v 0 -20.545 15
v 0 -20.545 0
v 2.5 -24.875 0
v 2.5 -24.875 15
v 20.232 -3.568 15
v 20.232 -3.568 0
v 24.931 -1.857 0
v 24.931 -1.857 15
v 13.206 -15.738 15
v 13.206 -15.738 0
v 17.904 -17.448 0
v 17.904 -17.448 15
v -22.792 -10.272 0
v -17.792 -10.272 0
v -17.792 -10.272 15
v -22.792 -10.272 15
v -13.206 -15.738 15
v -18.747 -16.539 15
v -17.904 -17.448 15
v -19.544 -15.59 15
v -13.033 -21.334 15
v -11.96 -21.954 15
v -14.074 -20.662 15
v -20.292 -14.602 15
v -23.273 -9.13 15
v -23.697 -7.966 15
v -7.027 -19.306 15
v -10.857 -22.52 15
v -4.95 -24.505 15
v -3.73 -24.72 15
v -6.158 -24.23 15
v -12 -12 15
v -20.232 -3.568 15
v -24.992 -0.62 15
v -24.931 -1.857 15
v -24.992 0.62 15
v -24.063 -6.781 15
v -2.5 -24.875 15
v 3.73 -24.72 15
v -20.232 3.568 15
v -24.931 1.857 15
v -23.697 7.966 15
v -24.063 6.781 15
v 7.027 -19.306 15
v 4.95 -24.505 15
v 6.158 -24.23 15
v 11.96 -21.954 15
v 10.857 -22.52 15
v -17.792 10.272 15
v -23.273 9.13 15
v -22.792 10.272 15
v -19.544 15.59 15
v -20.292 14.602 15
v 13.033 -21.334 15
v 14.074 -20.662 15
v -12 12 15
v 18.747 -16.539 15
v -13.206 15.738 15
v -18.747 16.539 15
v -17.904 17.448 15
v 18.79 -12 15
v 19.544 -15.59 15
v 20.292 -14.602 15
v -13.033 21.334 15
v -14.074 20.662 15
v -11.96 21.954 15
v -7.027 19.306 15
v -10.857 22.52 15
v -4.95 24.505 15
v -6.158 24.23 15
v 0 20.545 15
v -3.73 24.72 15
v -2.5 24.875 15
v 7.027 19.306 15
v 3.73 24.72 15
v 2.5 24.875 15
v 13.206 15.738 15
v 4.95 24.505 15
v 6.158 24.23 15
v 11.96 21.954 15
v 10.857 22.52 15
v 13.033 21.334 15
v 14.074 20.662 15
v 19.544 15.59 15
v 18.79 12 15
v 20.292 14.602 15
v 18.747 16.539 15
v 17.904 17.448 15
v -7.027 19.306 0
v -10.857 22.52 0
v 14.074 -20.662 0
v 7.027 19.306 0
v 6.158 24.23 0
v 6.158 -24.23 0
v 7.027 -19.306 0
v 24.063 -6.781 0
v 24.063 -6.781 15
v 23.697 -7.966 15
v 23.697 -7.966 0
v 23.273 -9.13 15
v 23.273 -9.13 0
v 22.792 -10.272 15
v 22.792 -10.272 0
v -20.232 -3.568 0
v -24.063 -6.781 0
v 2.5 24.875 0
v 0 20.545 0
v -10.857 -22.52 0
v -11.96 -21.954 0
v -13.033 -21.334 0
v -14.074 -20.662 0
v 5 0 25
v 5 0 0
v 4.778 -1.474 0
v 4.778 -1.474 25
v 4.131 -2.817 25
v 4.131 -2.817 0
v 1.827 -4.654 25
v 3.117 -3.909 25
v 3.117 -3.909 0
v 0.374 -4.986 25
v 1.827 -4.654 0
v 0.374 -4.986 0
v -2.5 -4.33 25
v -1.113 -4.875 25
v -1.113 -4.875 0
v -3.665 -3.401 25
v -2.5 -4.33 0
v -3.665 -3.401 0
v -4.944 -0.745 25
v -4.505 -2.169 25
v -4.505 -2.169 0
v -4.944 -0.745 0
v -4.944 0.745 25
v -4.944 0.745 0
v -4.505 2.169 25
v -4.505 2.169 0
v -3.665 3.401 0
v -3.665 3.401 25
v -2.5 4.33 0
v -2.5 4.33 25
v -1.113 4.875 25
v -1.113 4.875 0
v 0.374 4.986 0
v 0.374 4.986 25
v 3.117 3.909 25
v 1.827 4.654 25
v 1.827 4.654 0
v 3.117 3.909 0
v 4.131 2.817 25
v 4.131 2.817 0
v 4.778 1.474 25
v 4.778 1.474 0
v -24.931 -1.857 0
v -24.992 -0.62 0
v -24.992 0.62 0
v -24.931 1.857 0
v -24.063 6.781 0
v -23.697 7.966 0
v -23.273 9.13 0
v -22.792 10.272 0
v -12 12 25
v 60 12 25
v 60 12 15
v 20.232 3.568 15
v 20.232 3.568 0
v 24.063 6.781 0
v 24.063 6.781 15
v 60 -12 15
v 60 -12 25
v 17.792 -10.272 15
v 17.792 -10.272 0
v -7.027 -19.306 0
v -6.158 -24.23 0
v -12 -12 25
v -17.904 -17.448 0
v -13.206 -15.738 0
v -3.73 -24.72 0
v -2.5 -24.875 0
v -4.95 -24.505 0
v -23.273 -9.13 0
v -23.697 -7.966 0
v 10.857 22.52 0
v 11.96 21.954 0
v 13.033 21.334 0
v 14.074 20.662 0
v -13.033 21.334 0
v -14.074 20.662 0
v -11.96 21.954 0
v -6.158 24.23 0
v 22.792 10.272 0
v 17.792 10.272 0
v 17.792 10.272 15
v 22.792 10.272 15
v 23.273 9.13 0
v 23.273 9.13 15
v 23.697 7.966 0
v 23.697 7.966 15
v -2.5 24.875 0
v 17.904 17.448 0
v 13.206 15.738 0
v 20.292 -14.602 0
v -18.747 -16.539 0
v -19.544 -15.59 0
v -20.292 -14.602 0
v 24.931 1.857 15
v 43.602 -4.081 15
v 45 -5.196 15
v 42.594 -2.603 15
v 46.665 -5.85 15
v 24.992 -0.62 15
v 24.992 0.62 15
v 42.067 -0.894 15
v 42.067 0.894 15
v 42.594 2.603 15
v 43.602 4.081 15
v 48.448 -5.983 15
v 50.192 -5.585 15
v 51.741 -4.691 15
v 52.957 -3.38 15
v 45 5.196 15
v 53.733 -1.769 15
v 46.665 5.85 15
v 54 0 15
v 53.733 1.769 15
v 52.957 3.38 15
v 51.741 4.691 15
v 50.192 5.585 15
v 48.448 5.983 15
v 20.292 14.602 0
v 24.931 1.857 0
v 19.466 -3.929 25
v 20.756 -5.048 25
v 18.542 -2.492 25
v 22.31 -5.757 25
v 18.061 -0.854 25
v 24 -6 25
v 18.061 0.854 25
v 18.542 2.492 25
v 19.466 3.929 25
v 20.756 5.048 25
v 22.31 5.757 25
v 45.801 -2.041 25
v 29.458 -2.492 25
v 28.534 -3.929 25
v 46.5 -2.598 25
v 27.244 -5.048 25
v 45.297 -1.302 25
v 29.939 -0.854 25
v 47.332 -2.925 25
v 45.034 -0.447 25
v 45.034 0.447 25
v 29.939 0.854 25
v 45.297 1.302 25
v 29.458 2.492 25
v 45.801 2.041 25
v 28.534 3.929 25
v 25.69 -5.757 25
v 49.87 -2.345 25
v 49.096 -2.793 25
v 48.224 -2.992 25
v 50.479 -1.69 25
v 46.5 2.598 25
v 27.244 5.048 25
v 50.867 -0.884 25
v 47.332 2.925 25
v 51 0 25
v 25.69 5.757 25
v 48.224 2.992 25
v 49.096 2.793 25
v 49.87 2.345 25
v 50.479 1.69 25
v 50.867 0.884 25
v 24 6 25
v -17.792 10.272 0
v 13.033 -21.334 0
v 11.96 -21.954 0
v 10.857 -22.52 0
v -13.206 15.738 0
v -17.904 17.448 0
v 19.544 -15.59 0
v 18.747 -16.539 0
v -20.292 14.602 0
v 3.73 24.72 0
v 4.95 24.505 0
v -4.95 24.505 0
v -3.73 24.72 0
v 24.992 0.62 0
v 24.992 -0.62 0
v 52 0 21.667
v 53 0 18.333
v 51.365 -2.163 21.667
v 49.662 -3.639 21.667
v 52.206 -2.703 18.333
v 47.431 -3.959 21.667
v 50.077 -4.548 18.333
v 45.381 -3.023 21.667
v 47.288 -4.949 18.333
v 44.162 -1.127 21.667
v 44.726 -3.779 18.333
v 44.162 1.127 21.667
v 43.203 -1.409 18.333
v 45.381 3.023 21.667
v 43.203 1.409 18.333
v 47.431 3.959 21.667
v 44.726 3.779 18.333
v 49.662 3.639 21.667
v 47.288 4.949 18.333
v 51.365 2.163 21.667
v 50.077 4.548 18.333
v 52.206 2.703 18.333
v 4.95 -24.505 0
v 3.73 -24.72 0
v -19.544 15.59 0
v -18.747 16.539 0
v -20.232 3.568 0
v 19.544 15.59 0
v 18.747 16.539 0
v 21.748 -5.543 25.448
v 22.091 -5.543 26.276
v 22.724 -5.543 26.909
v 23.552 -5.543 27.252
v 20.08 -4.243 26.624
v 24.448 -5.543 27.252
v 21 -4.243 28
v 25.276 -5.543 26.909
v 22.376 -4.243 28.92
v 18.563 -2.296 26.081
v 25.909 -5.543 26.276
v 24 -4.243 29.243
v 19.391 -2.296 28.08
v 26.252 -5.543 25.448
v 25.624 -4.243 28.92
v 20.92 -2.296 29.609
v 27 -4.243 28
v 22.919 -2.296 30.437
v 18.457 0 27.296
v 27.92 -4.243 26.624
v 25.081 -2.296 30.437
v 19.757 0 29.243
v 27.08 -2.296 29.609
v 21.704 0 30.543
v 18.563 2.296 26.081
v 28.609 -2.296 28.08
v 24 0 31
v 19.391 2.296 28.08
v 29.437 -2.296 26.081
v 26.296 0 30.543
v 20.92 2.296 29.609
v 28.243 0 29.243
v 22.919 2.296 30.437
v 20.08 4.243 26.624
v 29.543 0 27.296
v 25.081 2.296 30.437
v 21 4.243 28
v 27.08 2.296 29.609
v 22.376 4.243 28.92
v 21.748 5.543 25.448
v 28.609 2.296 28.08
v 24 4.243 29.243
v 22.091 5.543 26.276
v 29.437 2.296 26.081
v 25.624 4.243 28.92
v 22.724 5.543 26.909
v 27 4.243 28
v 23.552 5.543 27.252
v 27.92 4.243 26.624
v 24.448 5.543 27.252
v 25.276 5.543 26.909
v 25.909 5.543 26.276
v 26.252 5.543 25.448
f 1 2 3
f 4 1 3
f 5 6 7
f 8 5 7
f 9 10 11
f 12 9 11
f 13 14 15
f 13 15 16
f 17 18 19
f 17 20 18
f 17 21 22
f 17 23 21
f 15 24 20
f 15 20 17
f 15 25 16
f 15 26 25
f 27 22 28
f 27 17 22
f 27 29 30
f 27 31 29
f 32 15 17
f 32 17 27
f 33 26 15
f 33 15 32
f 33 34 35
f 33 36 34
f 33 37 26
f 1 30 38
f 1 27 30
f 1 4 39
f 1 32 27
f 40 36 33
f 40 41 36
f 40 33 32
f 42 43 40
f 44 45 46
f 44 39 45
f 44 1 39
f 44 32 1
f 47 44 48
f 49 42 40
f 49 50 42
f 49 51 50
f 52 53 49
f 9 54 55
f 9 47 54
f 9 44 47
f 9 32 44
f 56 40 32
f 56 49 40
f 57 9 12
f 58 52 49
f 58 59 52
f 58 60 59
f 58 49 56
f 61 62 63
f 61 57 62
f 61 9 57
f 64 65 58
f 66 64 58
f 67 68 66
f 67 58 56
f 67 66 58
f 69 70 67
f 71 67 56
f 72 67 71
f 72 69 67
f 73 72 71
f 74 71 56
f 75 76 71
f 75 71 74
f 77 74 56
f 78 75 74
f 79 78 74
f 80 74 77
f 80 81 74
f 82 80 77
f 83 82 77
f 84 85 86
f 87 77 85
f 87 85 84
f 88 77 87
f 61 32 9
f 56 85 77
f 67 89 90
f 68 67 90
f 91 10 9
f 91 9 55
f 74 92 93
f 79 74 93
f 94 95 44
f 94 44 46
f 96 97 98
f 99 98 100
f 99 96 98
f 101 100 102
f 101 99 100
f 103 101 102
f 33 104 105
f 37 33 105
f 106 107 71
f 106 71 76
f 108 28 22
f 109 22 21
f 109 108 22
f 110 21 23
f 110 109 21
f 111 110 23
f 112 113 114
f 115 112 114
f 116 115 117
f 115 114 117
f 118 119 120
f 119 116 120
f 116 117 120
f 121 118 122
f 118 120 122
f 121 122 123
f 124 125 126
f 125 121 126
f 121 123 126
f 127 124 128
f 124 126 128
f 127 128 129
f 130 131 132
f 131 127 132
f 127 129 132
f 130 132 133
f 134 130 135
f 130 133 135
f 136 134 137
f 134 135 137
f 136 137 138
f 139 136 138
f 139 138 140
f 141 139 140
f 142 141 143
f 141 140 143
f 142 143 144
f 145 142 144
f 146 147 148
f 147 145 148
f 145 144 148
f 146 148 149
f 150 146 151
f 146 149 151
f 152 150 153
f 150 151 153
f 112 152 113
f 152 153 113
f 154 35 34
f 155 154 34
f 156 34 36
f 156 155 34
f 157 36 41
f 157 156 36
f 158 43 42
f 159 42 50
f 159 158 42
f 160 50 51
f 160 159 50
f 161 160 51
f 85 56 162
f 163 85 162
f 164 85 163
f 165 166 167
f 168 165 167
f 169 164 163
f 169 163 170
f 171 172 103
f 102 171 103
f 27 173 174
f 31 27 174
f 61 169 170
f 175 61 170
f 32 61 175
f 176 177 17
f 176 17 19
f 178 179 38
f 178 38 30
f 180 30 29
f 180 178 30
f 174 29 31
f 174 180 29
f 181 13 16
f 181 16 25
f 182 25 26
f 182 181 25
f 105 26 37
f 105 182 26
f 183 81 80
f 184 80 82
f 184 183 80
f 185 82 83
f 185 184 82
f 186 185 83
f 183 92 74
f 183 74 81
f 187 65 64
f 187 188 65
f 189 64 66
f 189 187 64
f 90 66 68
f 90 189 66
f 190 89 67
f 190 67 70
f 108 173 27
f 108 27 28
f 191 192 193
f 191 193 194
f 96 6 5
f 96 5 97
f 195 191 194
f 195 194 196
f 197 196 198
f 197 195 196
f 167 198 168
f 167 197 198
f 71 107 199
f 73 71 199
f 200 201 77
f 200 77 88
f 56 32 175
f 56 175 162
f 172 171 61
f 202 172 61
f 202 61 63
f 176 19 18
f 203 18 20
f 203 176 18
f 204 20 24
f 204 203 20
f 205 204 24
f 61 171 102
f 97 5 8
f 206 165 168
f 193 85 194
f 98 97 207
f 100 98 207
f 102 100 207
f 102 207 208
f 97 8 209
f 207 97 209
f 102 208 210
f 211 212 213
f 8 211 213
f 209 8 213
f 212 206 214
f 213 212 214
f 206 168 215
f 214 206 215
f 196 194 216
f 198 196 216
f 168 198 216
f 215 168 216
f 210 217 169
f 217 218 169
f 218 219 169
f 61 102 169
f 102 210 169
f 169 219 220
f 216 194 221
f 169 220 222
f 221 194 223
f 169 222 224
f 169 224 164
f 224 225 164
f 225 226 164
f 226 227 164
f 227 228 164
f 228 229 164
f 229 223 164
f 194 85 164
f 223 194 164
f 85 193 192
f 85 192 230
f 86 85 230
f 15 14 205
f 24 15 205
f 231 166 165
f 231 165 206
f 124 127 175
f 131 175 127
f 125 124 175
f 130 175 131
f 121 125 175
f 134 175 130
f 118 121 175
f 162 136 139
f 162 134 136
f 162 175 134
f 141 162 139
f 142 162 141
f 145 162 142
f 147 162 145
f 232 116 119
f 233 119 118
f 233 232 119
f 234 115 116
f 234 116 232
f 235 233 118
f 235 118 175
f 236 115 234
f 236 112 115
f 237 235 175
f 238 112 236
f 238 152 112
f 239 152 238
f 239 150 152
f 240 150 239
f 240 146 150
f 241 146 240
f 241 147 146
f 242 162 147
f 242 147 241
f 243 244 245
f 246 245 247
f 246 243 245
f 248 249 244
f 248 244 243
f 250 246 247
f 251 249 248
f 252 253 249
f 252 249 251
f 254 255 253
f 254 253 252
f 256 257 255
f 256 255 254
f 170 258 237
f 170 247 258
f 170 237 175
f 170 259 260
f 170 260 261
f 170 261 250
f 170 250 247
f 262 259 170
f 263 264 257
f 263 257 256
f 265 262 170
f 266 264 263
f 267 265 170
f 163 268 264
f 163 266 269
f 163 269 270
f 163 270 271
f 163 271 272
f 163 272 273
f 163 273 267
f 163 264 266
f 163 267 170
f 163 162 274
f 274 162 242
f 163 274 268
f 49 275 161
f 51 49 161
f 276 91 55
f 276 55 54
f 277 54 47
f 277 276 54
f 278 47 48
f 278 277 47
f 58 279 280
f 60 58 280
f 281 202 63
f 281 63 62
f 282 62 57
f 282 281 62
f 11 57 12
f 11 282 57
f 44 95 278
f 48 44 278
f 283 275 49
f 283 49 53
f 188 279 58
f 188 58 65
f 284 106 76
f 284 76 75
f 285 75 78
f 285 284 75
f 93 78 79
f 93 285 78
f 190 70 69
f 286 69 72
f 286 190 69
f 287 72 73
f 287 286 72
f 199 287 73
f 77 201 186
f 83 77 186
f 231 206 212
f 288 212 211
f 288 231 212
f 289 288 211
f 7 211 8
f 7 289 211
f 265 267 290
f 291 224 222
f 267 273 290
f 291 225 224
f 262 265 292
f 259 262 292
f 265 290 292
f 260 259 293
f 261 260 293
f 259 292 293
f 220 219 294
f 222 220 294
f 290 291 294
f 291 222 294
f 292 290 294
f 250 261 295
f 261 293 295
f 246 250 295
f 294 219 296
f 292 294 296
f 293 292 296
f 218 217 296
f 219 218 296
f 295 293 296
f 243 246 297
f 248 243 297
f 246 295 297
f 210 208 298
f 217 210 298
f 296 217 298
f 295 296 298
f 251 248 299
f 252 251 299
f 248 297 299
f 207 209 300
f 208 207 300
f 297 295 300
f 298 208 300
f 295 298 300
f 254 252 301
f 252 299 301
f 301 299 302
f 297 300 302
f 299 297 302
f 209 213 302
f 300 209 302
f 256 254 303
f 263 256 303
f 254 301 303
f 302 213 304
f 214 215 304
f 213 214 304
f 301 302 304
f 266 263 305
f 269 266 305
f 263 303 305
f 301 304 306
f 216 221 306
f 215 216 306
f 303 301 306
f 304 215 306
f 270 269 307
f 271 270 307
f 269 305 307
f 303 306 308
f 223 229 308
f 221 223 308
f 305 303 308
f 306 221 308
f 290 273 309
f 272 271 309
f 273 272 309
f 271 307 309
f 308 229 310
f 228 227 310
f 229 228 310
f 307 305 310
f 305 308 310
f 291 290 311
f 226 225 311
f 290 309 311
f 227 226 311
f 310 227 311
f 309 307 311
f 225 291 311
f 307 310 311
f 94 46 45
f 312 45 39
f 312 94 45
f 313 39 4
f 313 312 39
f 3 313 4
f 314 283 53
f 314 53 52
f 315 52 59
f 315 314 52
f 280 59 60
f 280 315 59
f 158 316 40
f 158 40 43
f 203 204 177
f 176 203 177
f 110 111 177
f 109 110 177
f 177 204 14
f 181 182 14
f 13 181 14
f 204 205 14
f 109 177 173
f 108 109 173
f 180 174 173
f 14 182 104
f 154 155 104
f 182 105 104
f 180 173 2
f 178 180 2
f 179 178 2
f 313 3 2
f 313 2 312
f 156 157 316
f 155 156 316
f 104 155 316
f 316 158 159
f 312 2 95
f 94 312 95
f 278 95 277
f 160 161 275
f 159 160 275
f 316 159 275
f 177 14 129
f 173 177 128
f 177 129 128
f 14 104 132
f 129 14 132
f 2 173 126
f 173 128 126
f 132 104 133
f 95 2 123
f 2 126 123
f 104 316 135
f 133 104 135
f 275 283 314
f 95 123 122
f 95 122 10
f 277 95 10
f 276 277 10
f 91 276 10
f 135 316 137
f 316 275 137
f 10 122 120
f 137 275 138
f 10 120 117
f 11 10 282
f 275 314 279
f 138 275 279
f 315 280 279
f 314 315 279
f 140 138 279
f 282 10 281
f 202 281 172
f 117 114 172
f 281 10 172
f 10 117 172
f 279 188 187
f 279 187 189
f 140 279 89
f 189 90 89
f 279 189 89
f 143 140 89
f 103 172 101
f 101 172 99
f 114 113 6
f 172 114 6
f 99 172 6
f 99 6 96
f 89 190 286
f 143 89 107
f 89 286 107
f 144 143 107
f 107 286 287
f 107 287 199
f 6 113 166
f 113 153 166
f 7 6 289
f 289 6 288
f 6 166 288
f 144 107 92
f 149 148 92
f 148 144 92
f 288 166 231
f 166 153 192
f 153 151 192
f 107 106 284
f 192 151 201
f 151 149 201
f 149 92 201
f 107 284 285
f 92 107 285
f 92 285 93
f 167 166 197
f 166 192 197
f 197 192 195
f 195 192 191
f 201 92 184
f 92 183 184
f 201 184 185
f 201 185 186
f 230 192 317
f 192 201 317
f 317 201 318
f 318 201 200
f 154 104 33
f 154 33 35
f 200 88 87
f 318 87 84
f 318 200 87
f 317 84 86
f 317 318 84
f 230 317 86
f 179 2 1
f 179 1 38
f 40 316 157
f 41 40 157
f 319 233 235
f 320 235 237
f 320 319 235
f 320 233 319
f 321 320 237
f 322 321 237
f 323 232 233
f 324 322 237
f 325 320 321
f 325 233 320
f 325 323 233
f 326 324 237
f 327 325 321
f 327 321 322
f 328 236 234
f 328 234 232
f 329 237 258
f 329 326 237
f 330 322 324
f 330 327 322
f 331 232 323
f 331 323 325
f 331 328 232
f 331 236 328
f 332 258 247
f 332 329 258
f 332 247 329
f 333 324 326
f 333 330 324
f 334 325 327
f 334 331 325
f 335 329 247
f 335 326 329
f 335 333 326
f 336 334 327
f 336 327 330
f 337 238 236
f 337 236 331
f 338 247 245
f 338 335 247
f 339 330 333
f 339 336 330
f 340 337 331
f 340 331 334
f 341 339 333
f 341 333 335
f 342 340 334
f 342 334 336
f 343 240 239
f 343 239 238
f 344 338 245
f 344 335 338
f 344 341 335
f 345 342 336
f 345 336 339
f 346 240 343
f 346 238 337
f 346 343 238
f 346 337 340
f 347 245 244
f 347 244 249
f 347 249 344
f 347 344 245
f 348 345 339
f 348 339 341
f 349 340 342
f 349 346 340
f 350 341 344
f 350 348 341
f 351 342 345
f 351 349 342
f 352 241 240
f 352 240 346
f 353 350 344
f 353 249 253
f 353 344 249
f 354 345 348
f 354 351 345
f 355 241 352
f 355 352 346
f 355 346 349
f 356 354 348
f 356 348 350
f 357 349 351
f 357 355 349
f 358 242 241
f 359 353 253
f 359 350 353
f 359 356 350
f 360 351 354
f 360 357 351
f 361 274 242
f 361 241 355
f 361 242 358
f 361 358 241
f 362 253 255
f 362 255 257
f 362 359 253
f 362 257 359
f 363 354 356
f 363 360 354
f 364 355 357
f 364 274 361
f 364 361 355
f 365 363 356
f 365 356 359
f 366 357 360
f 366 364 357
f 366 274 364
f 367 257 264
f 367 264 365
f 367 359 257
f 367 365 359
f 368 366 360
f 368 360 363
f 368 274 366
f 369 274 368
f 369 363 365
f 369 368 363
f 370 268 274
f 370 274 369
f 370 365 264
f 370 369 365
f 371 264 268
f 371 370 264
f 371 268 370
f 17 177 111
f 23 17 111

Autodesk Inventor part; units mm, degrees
ref_plane "YZ Plane" through (0, 0, 0) normal (1, 0, 0) x (0, 1, 0)
ref_plane "XZ Plane" through (0, 0, 0) normal (0, 1, 0) x (-1, 0, 0)
ref_plane "XY Plane" through (0, 0, 0) normal (0, 0, 1) x (1, 0, 0)
sketch "Sketch1" plane through (0, 0, 0) normal (0, 0, 1) x (1, 0, 0)
  circle A0 centre (0, 0) radius 25
  circle A1 centre (0, 0) radius 5
  dimension "d0" = 50
  dimension "d1" = 10
extrude "Extrusion1" add sketch "Sketch1" along normal blind 15
sketch "Sketch2" plane through (0, 0, 15) normal (0, 0, 1) x (1, 0, 0)
  circle A0 centre (0, 0) radius 25 projected
  line L0 (0, 25) -> (5, 25) construction
  line L1 (0, 20) -> (6.1776, 20) construction
  line L2 (-2.7962, 24.8431) -> (2.2038, 24.8431) construction
  line L3 (0, 20.5446) -> (2.5, 24.8747)
  line L4 (0, 20.5446) -> (5, 20.5446) construction
  circle A1 centre (0, 0) radius 25 projected
  line L5 (0, 20.5446) -> (0, 24.8431) construction
  line L6 (0, 20.5446) -> (-2.5, 24.8747)
  arc A2 (2.5, 24.8747) -> (-2.5, 24.8747) centre (0, 0) ccw
  dimension "d32" = 5
  dimension "d33" = 60
extrude "Extrusion2" cut sketch "Sketch2" against normal through all contours L3 L6 A0 picked at (1.1115, 23.4685)
pattern_circular "Circular Pattern1" count 18 over 360 about axis through (0, 0, -10) along (0, 0, 1) of "Extrusion2"
sketch "Sketch3" plane through (0, 0, 15) normal (0, 0, 1) x (1, 0, 0)
  line L0 (-12, 12) -> (60, 12)
  line L1 (60, 12) -> (60, -12)
  line L2 (60, -12) -> (-12, -12)
  line L3 (-12, -12) -> (-12, 12)
  circle A0 centre (0, 0) radius 5 projected
  point P0 (-12, 0)
  dimension "d13" = 12
  dimension "d14" = 12
  dimension "d15" = 60
extrude "Extrusion4" add sketch "Sketch3" along normal blind 10
sketch "Sketch4" plane through (0, 0, 15) normal (0, 0, -1) x (-1, 0, 0)
  circle A0 centre (-48, 0) radius 6
  line L0 (-60, 12) -> (-60, -12) construction
  point P0 (0, 0)
  dimension "d20" = 12
  dimension "d21" = 12
sketch "Sketch5" plane through (0, 0, 25) normal (0, 0, 1) x (1, 0, 0)
  circle A0 centre (48, 0) radius 3
  line L0 (60, -12) -> (60, 12) construction
  point P0 (0, 0)
  point P1 (0, 0)
  dimension "d22" = 6
  dimension "d23" = 12
loft "Loft1" cut profiles "Sketch5", "Sketch4"
sketch "Sketch6" plane through (0, 0, 25) normal (0, 0, 1) x (1, 0, 0)
  arc A0 (24, -6) -> (24, 6) centre (24, 0) ccw
  line L0 (-12, -12) -> (60, -12) projected
  line L1 (24, -6) -> (24, 6)
  point P0 (0, 0)
  point P1 (24, -12)
  dimension "d28" = 12
revolve "Revolution1" add sketch "Sketch6" angle 360 about axis through (24, -6, 25) along (0, 1, 0)
equation "\"d1\" = 0.2 * d0"
equation "\"d21\" = d20"
equation "\"d22\" = 0.5 * d20"
equation "\"d23\" = d21"
properties part number "Parcial3"
